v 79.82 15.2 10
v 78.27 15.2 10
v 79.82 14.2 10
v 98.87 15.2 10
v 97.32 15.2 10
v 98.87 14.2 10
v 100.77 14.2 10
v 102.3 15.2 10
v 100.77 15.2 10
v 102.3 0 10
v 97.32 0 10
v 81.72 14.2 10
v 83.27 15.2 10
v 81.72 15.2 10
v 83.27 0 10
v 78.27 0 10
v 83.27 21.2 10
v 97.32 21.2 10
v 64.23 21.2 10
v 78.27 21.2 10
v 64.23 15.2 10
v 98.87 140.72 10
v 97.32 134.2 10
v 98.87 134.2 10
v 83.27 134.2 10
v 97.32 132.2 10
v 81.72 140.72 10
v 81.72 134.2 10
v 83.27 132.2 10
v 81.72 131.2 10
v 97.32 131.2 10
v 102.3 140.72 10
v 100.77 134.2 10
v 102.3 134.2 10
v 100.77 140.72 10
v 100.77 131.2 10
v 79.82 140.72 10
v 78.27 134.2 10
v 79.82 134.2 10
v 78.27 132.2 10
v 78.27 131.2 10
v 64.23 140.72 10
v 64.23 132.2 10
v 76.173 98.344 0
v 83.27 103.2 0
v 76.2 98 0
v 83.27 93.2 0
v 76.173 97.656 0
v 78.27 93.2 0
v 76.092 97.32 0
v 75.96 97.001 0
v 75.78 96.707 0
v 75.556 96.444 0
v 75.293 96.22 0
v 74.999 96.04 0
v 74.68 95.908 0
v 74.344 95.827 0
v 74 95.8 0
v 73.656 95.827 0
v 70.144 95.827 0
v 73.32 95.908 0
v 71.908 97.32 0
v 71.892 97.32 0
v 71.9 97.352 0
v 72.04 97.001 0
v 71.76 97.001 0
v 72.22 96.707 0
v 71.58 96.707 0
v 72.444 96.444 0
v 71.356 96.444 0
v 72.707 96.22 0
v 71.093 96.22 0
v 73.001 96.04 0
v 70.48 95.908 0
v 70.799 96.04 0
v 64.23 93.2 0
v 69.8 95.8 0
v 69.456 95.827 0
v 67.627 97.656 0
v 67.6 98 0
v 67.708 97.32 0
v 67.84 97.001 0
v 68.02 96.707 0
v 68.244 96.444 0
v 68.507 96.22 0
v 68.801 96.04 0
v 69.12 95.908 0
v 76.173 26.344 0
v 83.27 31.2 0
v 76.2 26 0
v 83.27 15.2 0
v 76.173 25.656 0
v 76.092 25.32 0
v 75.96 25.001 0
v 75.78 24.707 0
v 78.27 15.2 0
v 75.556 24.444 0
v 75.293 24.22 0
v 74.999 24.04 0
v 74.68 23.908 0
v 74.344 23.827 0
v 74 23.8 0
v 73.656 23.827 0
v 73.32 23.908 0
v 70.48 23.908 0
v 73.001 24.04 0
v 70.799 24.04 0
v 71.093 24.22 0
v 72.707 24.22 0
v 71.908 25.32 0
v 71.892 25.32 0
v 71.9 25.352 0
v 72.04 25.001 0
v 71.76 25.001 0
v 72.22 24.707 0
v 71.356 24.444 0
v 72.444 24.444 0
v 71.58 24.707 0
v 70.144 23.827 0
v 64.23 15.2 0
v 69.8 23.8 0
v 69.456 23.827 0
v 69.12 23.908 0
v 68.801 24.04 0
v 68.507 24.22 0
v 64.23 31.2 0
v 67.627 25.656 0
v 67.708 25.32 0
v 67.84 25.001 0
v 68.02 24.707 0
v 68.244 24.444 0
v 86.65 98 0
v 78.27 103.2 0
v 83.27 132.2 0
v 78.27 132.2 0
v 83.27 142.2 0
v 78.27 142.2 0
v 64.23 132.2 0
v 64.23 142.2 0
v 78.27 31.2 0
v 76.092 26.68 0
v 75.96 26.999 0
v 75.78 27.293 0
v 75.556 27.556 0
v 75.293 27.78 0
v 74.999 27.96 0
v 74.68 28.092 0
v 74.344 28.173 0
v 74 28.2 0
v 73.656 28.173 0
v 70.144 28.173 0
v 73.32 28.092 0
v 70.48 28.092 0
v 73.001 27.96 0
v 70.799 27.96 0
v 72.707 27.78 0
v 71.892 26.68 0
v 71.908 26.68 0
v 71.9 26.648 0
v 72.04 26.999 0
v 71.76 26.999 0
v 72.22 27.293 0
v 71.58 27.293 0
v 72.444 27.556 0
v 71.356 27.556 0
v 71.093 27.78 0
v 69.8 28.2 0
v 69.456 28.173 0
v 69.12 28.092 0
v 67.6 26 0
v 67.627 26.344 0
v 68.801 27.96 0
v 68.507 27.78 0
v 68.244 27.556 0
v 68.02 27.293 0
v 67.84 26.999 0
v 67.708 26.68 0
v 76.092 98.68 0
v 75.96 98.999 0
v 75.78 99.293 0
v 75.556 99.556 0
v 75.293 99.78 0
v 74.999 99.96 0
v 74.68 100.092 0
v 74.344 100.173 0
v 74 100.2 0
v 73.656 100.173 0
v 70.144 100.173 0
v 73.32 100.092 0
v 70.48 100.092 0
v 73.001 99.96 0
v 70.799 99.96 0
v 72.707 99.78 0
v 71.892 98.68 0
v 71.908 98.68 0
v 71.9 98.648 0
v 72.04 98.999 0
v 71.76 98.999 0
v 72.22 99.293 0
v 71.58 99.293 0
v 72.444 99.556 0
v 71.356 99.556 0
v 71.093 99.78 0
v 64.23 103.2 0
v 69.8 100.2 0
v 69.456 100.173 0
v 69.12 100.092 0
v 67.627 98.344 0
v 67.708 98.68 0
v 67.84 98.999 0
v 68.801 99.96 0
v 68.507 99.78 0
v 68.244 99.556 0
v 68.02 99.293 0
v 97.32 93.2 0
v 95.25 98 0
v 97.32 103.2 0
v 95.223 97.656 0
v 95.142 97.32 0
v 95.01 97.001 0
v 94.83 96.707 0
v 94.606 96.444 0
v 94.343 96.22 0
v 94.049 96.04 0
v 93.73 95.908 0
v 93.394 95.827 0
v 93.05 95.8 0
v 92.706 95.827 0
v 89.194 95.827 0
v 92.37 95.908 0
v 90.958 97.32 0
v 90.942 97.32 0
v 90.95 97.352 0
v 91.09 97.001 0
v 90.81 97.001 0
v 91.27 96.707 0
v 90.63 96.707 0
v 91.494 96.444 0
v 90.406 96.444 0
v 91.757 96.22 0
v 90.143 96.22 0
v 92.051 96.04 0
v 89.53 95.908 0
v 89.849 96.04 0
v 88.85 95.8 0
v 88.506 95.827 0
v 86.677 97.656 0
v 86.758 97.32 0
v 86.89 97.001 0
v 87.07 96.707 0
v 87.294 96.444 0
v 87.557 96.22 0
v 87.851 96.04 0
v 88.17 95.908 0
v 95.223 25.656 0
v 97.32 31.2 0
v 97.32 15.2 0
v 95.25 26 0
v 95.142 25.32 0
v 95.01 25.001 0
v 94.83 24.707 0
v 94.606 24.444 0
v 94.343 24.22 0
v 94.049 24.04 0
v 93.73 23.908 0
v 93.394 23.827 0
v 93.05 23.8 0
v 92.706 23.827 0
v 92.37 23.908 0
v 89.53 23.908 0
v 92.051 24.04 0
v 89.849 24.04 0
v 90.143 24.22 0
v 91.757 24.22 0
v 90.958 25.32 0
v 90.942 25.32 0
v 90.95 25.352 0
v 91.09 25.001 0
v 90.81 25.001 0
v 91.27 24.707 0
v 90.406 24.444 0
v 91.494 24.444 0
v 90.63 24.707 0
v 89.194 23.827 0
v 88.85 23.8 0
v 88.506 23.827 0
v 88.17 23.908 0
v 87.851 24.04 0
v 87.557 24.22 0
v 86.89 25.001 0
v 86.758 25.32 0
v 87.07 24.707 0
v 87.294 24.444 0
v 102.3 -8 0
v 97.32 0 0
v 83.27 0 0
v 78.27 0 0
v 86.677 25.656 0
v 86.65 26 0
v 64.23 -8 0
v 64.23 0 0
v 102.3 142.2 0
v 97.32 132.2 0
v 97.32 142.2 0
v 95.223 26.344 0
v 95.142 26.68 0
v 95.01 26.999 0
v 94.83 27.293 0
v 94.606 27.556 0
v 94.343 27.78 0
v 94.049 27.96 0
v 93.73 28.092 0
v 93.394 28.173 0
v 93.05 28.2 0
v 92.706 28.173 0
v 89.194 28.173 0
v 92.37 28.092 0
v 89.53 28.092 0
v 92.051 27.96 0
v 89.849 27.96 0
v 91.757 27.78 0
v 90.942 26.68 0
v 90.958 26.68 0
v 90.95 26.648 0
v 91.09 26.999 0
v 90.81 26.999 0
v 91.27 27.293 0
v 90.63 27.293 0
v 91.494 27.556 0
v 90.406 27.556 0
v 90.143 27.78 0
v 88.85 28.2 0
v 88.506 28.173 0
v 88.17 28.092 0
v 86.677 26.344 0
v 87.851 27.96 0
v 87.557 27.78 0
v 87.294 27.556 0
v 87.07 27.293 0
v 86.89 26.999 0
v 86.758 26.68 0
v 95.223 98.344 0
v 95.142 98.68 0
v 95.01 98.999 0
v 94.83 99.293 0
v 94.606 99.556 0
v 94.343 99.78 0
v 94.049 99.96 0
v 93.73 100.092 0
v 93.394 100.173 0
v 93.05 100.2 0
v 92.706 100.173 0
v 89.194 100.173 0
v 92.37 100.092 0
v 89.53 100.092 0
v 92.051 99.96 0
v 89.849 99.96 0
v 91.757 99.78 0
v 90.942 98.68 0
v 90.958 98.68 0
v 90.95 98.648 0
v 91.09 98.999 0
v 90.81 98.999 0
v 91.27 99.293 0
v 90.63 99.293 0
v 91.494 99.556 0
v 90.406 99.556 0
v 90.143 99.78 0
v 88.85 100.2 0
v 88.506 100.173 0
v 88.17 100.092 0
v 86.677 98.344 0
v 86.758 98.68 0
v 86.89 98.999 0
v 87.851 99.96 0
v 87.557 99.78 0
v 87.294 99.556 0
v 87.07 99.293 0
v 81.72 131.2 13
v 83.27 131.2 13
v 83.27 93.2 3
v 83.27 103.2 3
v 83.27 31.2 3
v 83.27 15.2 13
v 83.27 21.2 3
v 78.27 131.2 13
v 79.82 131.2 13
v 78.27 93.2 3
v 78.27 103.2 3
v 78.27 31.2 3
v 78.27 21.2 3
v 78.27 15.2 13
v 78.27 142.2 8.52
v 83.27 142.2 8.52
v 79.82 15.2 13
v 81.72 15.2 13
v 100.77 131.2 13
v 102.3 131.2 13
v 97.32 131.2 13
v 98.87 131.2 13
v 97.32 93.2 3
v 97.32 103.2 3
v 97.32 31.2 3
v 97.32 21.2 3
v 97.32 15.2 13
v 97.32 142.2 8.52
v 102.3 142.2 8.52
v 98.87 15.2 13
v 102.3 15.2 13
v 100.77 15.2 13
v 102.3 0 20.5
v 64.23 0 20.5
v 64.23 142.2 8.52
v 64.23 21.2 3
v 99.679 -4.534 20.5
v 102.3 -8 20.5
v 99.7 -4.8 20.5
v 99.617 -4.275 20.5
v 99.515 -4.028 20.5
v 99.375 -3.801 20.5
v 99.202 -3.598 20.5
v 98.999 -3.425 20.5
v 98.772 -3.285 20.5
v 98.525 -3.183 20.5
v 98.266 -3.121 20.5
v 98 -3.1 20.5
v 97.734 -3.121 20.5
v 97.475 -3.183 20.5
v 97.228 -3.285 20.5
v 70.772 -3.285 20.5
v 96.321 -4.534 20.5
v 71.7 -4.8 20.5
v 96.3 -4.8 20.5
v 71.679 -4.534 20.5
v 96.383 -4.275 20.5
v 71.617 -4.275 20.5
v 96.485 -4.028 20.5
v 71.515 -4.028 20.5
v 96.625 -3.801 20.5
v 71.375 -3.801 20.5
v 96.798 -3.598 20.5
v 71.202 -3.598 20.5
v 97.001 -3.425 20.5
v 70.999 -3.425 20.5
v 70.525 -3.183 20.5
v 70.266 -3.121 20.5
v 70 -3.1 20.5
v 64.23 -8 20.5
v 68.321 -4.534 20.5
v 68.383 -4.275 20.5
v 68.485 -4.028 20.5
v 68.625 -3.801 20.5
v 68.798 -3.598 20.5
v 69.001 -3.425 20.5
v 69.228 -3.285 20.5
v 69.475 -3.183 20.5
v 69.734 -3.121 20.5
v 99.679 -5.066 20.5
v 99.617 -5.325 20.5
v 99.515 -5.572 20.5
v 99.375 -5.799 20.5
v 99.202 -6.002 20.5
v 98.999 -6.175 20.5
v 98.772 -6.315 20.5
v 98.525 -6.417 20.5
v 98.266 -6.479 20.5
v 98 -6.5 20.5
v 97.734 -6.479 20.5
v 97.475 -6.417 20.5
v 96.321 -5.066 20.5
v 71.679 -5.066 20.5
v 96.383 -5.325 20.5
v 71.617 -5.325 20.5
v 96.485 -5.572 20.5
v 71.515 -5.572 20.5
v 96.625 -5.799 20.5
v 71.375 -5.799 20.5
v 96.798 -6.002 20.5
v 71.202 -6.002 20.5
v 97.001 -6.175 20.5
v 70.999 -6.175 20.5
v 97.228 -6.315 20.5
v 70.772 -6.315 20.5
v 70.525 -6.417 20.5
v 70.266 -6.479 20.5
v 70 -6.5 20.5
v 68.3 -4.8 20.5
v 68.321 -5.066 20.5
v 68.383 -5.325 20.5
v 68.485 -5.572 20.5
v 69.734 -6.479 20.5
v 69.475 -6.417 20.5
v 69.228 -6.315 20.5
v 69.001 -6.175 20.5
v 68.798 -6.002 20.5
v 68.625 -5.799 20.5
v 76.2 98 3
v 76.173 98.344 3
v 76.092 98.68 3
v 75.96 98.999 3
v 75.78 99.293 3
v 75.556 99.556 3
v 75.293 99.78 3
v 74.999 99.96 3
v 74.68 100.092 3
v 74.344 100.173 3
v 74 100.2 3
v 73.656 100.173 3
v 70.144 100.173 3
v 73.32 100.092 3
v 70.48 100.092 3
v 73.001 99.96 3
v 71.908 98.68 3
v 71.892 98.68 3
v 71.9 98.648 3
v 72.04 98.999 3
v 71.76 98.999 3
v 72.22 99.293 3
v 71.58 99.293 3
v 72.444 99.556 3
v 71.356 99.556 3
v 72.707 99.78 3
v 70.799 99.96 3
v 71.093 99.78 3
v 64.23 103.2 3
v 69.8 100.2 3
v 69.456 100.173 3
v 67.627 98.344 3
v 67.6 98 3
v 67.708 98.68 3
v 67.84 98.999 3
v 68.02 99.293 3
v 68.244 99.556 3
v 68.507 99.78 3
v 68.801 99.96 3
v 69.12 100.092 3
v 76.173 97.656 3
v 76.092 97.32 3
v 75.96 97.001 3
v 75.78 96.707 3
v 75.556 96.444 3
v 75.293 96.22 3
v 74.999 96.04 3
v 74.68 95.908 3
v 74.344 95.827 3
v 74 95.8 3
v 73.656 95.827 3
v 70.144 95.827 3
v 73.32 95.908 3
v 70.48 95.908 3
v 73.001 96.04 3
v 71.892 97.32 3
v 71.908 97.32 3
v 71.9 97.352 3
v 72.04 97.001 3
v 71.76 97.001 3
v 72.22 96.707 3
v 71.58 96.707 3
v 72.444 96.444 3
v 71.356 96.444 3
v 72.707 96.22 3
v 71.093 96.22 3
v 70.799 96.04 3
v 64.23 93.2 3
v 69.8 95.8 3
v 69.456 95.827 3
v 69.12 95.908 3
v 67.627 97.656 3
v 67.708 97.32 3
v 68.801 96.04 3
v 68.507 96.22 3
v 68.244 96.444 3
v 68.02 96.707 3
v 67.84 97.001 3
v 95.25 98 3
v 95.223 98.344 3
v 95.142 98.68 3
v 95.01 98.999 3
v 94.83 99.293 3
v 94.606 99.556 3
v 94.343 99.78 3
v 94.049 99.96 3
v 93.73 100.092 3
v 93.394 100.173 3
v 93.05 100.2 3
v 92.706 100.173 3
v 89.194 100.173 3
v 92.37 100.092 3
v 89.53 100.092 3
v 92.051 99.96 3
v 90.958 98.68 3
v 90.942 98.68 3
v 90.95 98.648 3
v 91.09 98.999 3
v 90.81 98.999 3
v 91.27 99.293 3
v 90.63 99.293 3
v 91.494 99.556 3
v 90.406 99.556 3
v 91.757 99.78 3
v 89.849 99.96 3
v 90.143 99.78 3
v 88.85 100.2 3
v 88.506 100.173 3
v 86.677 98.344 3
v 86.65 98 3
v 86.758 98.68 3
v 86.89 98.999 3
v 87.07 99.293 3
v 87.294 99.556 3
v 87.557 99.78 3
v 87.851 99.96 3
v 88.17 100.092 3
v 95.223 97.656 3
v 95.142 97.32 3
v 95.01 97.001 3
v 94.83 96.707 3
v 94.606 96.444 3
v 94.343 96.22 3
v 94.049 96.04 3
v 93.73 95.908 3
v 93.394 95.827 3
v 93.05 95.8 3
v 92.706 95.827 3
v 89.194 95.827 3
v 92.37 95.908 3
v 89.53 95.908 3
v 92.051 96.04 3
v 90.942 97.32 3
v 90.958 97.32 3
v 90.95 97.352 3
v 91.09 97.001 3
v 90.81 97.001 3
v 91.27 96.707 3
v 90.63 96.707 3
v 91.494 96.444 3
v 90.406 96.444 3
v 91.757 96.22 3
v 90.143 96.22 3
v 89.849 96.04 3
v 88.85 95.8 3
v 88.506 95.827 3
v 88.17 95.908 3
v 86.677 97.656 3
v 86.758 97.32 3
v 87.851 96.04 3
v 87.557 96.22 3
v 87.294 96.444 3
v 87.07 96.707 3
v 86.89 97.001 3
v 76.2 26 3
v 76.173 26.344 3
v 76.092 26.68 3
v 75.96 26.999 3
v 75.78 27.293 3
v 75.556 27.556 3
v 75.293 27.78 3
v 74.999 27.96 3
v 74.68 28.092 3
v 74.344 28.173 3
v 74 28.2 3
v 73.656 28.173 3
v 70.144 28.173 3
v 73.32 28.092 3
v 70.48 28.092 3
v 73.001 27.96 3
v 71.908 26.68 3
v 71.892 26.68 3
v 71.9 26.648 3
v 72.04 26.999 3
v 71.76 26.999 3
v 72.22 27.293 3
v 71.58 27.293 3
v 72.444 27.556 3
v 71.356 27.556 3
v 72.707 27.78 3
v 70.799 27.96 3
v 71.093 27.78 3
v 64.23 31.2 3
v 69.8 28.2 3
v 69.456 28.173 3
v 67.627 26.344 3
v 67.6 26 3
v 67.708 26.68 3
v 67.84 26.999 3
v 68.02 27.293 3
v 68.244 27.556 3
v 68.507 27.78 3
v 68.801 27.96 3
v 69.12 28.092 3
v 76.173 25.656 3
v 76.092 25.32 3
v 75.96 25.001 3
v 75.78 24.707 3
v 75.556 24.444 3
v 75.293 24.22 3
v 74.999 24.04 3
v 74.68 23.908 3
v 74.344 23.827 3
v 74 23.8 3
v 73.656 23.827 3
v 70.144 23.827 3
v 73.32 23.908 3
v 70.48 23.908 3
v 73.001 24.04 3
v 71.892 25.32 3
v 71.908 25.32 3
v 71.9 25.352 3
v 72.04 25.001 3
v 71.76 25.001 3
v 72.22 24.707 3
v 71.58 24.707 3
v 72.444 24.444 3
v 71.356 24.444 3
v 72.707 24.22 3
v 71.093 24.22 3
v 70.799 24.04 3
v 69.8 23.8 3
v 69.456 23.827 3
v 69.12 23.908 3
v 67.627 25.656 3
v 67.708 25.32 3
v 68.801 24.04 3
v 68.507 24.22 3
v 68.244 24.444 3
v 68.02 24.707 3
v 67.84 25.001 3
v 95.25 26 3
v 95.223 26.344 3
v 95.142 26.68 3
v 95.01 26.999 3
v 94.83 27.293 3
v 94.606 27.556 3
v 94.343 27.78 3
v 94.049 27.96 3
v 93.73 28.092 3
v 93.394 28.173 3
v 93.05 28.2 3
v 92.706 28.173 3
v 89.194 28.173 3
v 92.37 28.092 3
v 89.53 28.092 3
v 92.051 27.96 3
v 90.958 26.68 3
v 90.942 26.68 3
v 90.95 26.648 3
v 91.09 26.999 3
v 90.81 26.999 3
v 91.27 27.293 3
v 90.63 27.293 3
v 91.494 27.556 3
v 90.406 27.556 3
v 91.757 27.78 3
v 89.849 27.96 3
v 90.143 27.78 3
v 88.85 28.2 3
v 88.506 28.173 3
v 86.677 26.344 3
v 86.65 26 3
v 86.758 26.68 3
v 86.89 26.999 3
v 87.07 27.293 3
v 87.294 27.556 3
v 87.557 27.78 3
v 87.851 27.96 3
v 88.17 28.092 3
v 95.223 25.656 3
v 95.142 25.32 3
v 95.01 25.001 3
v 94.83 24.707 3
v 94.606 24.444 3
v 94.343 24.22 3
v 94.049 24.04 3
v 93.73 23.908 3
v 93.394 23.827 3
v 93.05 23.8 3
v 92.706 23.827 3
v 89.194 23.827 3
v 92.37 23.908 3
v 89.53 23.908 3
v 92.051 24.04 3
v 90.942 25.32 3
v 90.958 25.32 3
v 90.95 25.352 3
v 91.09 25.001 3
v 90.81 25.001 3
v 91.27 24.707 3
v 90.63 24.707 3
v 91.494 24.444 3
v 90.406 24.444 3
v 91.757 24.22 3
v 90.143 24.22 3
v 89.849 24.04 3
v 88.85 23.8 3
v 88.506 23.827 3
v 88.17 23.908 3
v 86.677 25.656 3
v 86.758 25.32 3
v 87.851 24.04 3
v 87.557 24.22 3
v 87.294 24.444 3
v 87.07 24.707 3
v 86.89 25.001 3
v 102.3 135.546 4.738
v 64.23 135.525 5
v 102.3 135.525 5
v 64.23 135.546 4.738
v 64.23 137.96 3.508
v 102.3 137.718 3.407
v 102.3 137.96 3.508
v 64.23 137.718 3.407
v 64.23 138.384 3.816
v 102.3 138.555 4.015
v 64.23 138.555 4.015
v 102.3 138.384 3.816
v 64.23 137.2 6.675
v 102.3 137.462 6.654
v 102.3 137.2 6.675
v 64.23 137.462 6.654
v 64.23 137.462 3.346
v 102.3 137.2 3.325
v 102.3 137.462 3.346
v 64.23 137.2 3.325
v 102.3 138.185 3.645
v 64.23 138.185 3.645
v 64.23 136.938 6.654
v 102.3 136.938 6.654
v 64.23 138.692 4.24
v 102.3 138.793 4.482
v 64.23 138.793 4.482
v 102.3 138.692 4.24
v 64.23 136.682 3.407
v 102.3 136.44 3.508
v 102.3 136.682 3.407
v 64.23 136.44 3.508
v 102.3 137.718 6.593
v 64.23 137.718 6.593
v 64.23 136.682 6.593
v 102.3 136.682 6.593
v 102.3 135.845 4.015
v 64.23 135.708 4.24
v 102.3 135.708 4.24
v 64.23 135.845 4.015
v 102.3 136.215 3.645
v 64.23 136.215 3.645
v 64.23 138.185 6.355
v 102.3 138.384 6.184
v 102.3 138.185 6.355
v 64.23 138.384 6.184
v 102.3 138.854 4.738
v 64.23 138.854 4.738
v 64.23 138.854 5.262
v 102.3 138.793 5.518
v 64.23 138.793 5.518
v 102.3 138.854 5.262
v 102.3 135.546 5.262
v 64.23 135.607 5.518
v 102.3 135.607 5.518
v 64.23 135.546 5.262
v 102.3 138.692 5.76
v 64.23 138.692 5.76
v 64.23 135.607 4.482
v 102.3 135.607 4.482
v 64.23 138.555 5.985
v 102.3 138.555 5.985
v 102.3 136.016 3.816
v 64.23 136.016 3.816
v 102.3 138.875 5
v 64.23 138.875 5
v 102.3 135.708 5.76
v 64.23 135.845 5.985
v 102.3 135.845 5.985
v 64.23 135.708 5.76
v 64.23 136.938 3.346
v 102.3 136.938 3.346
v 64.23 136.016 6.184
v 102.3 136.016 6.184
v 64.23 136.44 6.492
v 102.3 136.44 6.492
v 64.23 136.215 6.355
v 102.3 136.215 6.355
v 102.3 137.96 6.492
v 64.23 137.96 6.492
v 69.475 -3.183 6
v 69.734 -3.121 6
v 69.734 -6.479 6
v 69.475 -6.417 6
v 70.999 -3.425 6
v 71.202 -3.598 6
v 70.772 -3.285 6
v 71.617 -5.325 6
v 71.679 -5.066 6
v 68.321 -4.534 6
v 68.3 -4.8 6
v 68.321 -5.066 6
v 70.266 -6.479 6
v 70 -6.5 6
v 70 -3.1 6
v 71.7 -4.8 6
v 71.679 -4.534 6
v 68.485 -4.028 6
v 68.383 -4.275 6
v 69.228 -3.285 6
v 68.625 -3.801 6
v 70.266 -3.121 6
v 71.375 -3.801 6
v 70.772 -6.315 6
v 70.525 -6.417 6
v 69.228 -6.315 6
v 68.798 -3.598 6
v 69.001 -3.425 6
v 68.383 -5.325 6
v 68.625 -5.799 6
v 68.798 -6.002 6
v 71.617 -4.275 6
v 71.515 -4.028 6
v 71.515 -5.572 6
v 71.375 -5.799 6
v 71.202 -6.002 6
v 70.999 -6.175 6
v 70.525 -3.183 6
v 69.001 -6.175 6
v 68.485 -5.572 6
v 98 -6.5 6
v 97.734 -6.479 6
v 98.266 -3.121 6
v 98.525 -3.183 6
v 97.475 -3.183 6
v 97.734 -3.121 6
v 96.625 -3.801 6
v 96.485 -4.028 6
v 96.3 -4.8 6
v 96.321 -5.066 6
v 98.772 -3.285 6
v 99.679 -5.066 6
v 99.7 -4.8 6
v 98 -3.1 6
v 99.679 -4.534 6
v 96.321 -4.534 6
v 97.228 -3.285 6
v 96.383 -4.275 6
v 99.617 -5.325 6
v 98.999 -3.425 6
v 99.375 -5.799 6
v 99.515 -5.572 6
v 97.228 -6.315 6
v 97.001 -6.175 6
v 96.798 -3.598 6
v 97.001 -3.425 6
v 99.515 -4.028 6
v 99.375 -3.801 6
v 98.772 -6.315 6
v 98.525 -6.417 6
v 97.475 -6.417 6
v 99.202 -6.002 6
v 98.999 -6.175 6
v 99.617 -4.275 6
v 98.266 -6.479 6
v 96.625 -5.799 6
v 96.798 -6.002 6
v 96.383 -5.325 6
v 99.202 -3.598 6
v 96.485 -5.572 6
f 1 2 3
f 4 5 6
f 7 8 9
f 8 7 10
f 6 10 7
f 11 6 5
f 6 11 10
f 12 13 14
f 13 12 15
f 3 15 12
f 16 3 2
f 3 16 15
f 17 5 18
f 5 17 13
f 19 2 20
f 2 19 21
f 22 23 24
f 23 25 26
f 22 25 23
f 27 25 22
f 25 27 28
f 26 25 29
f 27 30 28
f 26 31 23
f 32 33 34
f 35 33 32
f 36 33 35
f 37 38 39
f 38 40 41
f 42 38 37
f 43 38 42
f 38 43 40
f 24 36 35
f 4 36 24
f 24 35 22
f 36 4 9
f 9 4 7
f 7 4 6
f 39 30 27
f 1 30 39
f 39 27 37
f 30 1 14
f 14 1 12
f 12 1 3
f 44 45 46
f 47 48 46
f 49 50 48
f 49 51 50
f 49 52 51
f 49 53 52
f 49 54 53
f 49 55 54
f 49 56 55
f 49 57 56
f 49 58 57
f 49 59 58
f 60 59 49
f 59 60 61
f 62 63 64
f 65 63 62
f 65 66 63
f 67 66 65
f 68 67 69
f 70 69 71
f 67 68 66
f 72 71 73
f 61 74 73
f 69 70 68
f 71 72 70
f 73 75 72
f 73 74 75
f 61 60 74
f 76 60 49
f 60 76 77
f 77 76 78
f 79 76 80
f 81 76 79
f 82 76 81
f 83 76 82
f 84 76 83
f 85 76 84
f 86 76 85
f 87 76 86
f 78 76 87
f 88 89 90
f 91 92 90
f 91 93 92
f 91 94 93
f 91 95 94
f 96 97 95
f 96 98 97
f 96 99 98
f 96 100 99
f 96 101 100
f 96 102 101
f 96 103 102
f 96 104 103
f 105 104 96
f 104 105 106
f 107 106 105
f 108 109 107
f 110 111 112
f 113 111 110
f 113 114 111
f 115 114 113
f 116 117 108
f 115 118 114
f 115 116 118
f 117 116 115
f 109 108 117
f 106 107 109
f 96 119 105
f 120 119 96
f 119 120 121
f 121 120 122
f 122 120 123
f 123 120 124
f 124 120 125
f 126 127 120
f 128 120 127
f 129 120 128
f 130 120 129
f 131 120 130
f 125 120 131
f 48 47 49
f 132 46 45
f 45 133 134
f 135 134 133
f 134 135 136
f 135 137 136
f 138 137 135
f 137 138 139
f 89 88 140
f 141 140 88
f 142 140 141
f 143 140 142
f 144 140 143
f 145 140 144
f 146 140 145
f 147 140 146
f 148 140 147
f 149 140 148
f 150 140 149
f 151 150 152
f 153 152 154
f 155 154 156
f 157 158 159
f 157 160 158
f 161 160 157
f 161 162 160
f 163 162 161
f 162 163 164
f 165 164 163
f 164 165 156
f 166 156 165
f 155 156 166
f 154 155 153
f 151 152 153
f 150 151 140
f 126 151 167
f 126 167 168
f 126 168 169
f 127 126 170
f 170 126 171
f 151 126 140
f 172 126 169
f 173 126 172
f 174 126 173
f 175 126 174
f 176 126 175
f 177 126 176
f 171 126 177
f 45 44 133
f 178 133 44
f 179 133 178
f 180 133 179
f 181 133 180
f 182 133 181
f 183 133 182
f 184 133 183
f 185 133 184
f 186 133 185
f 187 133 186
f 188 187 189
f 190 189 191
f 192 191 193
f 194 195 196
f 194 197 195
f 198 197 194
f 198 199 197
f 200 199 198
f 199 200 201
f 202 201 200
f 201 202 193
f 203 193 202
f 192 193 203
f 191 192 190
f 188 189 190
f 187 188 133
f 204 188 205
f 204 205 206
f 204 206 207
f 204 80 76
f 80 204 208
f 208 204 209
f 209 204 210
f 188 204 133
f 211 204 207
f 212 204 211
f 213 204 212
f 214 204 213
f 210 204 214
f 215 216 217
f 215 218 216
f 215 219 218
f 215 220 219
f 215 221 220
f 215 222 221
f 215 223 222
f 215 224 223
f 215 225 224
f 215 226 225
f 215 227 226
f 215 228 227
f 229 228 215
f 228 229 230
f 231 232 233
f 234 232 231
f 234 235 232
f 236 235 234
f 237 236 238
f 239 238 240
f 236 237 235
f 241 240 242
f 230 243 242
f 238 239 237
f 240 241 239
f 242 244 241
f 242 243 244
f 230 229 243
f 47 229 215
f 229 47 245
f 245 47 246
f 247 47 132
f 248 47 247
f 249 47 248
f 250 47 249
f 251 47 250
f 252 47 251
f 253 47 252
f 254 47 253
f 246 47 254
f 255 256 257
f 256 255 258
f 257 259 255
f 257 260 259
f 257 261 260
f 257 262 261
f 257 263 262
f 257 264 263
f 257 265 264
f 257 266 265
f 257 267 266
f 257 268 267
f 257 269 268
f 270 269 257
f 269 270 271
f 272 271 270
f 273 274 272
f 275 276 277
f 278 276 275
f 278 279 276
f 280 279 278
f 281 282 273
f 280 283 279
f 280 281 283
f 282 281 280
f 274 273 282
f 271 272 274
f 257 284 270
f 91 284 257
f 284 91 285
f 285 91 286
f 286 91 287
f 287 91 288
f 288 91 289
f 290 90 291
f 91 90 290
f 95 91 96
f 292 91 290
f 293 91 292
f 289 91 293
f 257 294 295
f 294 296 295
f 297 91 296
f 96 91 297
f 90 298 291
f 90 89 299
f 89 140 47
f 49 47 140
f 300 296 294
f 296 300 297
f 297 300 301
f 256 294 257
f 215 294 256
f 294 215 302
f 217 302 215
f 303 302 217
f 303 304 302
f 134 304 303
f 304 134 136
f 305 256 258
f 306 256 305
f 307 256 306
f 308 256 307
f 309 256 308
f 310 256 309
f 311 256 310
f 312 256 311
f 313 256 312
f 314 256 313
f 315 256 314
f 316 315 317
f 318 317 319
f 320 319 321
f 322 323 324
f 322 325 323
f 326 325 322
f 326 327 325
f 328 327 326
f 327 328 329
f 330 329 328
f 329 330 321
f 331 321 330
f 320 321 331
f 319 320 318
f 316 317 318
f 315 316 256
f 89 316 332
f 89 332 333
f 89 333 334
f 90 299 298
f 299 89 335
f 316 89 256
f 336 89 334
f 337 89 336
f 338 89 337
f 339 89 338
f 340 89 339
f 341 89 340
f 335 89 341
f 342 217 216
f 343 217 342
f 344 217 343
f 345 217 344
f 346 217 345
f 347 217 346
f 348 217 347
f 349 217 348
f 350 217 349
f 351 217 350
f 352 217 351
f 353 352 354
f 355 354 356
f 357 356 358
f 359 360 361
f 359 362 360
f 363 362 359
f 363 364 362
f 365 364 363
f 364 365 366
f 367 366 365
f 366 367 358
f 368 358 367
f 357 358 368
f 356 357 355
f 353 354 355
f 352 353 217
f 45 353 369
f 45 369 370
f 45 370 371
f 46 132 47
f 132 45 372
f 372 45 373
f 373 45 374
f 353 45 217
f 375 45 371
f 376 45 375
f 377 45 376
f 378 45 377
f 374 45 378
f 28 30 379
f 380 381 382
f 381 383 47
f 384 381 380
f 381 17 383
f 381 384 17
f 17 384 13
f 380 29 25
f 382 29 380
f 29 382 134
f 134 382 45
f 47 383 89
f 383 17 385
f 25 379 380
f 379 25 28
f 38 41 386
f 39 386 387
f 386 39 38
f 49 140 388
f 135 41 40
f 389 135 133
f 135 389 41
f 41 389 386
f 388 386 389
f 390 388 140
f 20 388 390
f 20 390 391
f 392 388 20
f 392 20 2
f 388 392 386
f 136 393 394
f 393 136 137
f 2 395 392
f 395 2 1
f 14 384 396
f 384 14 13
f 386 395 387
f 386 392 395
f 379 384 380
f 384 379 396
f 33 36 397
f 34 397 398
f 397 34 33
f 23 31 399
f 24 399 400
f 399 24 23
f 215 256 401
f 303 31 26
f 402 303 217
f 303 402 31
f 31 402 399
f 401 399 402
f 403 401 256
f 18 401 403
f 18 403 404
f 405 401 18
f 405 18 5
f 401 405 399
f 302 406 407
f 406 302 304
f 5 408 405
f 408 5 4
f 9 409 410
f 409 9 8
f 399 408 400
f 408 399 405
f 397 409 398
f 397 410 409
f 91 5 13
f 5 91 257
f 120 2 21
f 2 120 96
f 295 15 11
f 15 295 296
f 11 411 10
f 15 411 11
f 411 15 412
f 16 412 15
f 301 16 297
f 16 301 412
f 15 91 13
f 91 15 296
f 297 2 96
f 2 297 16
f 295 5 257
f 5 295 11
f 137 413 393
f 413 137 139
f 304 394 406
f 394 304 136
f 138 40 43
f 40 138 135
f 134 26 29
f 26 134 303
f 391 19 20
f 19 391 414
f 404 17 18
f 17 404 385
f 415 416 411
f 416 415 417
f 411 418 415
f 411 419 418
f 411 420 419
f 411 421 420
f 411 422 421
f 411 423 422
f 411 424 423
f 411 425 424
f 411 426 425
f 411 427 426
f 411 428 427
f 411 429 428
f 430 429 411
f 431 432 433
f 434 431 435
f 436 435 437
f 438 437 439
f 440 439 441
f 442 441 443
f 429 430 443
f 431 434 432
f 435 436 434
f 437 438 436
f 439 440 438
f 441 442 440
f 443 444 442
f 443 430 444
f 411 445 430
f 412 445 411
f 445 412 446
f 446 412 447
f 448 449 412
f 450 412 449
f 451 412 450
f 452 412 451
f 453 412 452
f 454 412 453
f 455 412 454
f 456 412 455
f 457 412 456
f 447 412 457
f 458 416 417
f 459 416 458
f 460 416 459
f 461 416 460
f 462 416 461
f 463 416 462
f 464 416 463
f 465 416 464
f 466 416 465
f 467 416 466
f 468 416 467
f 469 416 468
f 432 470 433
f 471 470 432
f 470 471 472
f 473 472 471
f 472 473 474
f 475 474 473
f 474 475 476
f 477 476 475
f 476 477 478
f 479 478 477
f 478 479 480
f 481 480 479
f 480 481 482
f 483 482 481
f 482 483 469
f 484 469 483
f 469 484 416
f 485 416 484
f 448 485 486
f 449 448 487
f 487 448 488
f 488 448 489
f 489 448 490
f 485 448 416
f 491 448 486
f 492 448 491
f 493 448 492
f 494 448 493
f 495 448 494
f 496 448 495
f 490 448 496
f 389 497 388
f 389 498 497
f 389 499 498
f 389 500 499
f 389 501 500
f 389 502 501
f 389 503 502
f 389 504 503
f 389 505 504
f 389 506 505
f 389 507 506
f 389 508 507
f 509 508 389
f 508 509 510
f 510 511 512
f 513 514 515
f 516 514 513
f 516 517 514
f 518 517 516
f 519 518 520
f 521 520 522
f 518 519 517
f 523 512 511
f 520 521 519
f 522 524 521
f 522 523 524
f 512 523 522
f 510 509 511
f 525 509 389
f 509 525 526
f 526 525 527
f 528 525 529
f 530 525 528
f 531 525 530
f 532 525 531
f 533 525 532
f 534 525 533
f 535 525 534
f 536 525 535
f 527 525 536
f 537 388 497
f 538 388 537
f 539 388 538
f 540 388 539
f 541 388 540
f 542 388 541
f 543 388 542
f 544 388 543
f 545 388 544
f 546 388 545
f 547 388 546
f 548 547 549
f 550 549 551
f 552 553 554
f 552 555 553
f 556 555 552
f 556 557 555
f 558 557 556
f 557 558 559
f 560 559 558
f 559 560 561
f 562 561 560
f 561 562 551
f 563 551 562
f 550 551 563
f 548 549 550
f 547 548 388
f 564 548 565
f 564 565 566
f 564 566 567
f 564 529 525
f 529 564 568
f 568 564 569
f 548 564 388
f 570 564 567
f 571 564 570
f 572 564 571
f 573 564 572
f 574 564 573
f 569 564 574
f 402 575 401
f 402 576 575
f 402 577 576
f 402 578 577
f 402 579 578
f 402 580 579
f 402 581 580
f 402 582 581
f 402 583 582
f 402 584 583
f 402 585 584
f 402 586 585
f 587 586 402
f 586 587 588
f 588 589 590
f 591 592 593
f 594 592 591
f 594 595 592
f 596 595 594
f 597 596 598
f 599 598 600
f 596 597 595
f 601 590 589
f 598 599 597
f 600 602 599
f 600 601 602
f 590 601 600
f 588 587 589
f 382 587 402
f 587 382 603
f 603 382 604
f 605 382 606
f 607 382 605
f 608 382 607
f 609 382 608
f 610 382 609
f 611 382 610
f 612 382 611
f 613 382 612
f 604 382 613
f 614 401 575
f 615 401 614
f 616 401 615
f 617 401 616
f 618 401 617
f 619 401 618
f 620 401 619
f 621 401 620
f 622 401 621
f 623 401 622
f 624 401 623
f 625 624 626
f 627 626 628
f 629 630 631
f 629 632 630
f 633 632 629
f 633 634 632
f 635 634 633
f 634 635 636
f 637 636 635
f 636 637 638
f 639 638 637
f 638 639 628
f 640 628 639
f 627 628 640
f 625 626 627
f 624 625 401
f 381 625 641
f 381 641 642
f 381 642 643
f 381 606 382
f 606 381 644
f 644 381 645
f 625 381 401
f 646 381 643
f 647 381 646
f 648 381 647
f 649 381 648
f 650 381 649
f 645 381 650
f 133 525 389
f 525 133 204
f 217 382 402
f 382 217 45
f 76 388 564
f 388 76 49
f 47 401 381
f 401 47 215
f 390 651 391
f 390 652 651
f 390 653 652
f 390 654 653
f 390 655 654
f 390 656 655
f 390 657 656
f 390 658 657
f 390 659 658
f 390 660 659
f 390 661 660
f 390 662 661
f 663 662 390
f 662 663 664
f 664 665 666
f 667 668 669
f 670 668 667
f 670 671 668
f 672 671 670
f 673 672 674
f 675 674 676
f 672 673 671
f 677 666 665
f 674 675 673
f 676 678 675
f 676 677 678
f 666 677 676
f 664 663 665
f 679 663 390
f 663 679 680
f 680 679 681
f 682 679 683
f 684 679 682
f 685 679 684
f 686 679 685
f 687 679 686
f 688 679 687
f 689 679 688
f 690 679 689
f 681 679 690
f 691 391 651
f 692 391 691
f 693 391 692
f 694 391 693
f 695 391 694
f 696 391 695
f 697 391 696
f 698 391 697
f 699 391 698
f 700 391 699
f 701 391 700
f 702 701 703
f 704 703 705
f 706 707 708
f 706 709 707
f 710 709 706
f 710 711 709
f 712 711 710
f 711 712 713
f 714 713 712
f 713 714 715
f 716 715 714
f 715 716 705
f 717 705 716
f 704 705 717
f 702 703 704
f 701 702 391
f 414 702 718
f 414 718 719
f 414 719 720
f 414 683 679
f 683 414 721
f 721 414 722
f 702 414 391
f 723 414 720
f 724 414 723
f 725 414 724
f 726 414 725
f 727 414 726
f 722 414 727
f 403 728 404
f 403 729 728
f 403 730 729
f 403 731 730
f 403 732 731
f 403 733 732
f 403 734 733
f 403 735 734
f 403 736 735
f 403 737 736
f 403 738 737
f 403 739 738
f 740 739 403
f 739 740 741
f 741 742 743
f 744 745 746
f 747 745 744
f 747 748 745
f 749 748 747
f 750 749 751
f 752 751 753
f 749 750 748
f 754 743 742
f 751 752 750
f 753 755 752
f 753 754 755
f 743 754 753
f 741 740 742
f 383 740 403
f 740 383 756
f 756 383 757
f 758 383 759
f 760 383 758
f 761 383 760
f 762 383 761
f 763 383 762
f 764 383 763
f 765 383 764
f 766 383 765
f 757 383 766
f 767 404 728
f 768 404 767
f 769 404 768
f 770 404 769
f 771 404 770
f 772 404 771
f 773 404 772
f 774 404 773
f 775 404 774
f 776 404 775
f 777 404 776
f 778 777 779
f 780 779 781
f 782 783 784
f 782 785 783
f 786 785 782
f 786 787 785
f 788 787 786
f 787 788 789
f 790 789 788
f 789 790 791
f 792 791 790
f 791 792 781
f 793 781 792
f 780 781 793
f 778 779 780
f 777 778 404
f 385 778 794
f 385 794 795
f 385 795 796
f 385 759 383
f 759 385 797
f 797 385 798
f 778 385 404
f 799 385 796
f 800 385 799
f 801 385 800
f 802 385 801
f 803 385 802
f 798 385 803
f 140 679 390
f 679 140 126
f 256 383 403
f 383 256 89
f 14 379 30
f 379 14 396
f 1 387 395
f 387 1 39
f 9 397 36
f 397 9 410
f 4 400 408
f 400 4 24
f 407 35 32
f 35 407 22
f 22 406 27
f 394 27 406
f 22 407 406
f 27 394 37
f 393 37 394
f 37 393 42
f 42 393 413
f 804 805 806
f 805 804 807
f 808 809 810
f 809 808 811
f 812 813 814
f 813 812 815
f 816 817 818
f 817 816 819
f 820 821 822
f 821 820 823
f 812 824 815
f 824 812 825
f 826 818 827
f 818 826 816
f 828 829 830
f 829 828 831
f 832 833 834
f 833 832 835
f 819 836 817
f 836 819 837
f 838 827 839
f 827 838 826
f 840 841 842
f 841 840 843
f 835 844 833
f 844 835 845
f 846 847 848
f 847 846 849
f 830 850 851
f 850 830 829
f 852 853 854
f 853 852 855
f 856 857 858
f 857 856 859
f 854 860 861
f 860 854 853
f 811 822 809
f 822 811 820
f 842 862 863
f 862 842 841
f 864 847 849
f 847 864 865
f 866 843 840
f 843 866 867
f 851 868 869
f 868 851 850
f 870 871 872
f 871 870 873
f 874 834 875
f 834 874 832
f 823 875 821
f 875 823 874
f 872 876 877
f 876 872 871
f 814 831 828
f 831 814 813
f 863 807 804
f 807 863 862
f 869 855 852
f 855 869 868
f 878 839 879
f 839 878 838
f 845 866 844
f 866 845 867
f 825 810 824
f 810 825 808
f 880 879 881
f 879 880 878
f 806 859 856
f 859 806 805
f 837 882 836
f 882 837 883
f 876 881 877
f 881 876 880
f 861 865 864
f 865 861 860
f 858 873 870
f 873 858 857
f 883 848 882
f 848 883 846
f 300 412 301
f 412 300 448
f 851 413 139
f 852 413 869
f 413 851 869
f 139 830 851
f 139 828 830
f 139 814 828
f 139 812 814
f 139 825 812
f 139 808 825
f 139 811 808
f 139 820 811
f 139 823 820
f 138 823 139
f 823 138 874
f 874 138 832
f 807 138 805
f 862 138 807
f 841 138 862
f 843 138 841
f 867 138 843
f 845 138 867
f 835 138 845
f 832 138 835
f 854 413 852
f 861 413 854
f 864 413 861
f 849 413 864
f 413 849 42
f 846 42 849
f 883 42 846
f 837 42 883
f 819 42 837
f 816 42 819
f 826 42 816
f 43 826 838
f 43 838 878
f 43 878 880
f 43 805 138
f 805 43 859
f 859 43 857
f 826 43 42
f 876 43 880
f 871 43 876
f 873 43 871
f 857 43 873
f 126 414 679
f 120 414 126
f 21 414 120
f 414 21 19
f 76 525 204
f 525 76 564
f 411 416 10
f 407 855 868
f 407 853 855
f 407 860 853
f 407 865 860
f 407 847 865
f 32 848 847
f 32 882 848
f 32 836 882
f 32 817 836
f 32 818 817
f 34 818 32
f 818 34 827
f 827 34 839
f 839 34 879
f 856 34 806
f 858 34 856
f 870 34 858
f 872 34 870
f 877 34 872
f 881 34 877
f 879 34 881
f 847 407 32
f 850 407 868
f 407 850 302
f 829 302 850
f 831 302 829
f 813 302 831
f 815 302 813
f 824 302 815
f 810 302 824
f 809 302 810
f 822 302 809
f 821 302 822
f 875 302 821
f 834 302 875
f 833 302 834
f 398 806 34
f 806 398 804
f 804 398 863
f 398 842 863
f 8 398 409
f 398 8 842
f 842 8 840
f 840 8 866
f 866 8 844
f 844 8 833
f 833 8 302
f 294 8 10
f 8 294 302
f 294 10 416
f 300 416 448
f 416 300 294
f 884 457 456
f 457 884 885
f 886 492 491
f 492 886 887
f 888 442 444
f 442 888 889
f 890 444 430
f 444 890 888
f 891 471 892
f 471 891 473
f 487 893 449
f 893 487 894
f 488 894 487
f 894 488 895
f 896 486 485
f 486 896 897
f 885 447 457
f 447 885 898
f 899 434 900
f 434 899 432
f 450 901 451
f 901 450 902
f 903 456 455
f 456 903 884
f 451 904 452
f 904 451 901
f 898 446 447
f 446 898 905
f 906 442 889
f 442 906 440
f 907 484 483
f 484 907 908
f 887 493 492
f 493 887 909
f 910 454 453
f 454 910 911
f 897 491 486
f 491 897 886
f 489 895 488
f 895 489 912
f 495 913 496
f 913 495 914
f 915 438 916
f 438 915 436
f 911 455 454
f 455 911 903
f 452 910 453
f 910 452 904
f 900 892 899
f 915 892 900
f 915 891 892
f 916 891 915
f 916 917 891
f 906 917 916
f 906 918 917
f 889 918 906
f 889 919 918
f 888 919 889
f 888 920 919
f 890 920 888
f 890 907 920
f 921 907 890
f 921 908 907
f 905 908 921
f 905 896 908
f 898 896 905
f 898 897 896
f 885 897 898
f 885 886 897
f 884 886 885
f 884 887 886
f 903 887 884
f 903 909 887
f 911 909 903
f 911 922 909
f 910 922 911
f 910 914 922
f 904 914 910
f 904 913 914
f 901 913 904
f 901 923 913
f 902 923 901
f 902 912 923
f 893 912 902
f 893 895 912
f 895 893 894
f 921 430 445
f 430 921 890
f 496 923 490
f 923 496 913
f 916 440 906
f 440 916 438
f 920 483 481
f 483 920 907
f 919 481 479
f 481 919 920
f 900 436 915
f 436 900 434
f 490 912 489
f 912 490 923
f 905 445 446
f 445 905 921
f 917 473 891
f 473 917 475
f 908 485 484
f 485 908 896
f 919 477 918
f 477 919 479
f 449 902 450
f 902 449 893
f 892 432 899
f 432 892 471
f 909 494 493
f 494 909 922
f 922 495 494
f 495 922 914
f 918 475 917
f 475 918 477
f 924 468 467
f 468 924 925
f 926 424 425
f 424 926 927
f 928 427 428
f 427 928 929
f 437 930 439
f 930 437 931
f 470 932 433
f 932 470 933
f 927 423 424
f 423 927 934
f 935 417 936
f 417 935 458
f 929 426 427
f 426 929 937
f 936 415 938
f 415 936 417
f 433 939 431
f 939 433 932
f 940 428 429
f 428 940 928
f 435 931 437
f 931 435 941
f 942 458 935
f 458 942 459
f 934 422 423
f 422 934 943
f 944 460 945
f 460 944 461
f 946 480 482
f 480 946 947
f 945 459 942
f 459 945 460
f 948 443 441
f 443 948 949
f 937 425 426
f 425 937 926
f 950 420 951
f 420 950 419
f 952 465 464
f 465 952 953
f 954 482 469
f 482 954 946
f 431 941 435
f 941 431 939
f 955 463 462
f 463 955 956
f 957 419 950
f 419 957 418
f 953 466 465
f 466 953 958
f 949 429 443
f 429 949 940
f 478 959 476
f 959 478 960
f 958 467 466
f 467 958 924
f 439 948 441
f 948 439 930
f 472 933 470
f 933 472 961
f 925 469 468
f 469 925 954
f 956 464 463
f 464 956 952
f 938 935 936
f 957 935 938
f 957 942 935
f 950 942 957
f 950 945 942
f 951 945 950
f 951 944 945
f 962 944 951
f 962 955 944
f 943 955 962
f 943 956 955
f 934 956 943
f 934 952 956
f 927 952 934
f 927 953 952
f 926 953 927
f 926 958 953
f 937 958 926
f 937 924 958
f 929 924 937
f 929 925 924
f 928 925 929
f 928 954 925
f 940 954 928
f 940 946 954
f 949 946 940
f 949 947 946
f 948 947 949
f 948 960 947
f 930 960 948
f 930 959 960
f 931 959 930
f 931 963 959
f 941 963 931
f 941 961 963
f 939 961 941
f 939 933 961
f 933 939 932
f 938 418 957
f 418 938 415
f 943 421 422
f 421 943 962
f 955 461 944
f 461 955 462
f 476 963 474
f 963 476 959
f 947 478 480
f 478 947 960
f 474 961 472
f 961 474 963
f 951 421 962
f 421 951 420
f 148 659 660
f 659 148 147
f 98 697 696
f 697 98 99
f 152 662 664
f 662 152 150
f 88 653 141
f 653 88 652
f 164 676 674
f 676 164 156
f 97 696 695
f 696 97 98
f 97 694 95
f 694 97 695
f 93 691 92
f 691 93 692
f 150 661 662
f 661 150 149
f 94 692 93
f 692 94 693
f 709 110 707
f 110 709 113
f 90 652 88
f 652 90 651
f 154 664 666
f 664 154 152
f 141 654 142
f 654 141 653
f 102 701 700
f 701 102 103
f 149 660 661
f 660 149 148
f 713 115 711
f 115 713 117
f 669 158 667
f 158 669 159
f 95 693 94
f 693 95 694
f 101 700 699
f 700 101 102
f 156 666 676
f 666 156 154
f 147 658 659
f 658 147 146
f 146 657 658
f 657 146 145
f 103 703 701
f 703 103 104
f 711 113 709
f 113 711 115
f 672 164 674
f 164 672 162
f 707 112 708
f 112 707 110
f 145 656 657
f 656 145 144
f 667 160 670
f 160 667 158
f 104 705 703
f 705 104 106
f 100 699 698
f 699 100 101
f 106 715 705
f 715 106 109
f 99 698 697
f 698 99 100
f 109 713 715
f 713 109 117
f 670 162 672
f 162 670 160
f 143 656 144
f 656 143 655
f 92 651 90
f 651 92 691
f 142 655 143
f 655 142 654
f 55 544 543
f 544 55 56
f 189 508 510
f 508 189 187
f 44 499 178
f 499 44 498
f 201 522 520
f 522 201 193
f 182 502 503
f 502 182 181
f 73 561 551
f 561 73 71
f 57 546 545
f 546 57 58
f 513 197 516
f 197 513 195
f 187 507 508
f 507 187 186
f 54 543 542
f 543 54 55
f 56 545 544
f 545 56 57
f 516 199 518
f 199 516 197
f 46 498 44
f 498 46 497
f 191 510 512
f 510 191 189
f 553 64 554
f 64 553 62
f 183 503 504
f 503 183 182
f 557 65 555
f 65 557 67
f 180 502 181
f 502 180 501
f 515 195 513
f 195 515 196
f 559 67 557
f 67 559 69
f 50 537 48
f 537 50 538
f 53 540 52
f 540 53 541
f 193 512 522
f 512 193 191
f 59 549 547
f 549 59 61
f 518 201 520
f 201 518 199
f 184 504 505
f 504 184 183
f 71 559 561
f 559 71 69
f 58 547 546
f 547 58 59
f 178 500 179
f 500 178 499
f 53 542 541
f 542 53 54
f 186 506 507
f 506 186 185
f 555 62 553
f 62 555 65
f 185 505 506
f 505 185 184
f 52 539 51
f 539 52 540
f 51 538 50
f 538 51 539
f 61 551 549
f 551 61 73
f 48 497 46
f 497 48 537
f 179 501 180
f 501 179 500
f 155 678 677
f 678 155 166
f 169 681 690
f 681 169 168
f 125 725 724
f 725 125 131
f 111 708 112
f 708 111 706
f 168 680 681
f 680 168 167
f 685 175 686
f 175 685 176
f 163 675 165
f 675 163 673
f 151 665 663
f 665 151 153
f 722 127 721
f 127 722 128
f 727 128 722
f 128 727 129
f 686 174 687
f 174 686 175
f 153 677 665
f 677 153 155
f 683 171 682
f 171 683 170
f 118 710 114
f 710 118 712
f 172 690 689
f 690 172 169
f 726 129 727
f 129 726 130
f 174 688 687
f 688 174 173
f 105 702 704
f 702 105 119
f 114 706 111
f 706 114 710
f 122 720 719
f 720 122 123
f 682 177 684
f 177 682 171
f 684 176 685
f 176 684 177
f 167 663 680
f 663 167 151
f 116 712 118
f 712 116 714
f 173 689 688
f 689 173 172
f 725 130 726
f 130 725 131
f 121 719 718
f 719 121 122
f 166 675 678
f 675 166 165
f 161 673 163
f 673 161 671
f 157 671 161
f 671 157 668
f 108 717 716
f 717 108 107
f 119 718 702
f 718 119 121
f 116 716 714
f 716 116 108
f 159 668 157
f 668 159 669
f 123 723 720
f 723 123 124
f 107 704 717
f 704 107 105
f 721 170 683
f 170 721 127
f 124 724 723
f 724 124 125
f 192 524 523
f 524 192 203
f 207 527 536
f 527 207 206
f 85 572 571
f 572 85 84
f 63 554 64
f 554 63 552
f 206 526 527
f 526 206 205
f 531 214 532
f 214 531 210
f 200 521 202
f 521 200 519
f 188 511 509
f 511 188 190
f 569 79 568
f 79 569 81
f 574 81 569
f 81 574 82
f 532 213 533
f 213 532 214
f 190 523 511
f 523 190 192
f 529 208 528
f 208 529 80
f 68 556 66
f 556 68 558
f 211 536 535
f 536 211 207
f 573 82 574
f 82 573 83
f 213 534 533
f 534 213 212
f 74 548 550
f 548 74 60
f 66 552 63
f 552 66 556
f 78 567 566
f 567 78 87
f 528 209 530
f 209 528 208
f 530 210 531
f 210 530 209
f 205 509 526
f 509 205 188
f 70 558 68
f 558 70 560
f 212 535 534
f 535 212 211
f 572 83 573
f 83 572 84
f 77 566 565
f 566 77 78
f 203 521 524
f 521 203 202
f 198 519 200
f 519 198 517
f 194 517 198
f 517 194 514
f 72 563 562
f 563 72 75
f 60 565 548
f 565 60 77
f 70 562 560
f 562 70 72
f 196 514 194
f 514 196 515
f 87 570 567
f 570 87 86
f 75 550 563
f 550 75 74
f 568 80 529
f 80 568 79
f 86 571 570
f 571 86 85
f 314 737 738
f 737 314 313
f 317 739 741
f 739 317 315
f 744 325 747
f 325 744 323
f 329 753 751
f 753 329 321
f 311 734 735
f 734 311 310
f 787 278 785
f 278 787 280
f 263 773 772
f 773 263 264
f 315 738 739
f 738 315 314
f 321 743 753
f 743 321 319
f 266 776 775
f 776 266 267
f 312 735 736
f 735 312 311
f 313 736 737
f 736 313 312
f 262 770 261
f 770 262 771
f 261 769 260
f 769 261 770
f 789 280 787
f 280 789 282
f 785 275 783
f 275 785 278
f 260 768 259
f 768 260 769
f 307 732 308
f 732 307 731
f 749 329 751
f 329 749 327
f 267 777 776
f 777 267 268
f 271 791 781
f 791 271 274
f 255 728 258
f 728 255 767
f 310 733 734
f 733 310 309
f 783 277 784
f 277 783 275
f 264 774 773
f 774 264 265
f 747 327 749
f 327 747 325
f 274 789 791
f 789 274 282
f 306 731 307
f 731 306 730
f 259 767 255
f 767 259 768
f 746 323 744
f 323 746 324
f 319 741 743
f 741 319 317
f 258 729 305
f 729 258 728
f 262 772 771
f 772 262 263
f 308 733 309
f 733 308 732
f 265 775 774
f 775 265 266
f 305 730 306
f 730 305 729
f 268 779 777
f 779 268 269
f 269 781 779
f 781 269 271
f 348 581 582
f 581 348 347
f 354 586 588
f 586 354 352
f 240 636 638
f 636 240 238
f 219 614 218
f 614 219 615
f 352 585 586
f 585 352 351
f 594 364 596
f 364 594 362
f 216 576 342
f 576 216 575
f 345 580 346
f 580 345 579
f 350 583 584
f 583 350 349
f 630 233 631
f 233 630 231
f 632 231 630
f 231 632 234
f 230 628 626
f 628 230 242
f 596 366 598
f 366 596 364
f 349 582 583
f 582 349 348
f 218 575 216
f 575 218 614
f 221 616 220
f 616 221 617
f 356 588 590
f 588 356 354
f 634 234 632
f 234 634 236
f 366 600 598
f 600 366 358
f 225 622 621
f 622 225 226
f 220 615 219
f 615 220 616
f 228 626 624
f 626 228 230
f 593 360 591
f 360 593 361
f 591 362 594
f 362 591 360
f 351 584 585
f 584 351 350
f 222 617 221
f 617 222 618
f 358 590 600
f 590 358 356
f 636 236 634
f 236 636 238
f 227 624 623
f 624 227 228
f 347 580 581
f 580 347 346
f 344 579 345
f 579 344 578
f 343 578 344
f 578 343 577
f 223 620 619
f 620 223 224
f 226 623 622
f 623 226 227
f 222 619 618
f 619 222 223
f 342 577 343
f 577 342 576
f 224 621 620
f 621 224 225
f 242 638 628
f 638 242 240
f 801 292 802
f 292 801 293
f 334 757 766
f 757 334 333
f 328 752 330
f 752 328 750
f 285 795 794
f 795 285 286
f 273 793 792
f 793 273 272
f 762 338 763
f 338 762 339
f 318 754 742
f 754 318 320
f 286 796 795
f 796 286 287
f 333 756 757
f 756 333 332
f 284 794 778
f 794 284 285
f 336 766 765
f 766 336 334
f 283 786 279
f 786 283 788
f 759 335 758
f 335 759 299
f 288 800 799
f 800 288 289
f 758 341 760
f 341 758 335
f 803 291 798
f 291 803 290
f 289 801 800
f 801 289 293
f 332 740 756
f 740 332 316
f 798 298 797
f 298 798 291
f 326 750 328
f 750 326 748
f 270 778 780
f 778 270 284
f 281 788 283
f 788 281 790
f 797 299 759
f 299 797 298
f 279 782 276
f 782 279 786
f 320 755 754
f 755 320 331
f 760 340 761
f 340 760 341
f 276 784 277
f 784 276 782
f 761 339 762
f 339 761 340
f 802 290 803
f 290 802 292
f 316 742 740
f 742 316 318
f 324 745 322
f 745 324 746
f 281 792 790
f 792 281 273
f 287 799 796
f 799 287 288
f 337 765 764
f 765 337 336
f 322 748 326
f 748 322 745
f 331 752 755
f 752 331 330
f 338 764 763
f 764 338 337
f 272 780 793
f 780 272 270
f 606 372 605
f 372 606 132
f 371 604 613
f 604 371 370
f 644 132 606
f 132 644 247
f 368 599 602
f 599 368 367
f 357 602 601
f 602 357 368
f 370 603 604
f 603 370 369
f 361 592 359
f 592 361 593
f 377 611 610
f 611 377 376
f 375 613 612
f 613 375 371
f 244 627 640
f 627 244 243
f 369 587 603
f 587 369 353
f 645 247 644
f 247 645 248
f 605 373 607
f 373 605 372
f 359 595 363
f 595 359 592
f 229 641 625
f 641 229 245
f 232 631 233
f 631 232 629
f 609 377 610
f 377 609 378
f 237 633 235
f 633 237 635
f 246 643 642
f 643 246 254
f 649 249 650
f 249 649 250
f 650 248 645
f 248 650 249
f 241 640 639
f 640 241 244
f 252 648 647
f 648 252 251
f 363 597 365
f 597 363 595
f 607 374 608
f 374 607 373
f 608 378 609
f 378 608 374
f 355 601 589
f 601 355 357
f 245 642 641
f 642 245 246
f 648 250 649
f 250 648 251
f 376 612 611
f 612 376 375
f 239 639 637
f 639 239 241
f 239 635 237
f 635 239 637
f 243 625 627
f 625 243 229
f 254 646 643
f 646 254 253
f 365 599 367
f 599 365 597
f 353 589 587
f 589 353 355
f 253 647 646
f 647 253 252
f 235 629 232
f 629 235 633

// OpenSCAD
// This is the top side with card guides.
// Orientation:
// x = 0 : left edge of backplane PCB
// y = 0 : top of backplane
// z = 0 : outermost surface of card guide

include <s100_defs18-2c.scad>

$fn = 40;

lip_to_mod = (bp_hole_row3 - bp_hole_row2)/2 + bp_hole_row2 + mod_width/2 - mod_ofs - bp_height - edge[3];
lip_z = lip_to_mod + cg_slot_gap + cg_depth;
screw_cb = lip_z - attach_thick;


difference(){
  // Additions (guides, frame, lip, etc)
  union(){
    base_lip(lip_z, 0); //base (ancho, si no 0, mal)
    card_guides(0); //guias para la tarjeta
    add_frame(lip_z, 0); //estructura de soporte para las guias
    
    translate ([0,93.2,0]) cube([200,10,3]); //arriba soporte fan
    translate ([0,21.2,0]) cube([200,10,3]); //abajo soporte fan
 }
    
  // Removals (holes + slot cutouts)
  //translate ([0,+1.5,0]) mtg_holes(0); //agujeros de union al centro, cero o no.
  card_slots(0); //hueco para la tarjeta
  attach_holes(0); //agujeros para la barra sup
  attach_cutout(0); //cuadrados para barra sup
  support_holes(screw_threads, 1); //tornillo al frontal
  top_chamfer(0); //chaflan superior
  //cutout delantero
  translate([-34.04,-30,-10]) cube(size=[98.27,180,50]);  //0.5 recortado de -53.1
  //cutout trasero
  translate([102.3,-30,-10]) cube(size=[98,180,50]); //101.8 o 102.3
  rotate([90,0,0]) translate ([-20,-20,+8]) cube([190.5+40, 216+40, 9]); 
  translate ([70,-4.8,6]) rotate([0,0,90]) cylinder(h=15, d=3.4, center=false);
  translate ([98,-4.8,6]) rotate([0,0,90]) cylinder(h=15, d=3.4, center=false); 
 
  translate ([74,26,-2]) rotate([0,0,90]) cylinder(h=15, d=4.4, center=false);
  translate ([74,26+72,-2]) rotate([0,0,90]) cylinder(h=15, d=4.4, center=false);
  translate ([74-4.2,26,-2]) rotate([0,0,90]) cylinder(h=15, d=4.4, center=false);
  translate ([74-4.2,26+72,-2]) rotate([0,0,90]) cylinder(h=15, d=4.4, center=false);

  translate ([74+19.05,26,-2]) rotate([0,0,90]) cylinder(h=15, d=4.4, center=false);
  translate ([74+19.05,26+72,-2]) rotate([0,0,90]) cylinder(h=15, d=4.4, center=false);
  translate ([74-4.2+19.05,26,-2]) rotate([0,0,90]) cylinder(h=15, d=4.4, center=false);
  translate ([74-4.2+19.05,26+72,-2]) rotate([0,0,90]) cylinder(h=15, d=4.4, center=false);

 }
